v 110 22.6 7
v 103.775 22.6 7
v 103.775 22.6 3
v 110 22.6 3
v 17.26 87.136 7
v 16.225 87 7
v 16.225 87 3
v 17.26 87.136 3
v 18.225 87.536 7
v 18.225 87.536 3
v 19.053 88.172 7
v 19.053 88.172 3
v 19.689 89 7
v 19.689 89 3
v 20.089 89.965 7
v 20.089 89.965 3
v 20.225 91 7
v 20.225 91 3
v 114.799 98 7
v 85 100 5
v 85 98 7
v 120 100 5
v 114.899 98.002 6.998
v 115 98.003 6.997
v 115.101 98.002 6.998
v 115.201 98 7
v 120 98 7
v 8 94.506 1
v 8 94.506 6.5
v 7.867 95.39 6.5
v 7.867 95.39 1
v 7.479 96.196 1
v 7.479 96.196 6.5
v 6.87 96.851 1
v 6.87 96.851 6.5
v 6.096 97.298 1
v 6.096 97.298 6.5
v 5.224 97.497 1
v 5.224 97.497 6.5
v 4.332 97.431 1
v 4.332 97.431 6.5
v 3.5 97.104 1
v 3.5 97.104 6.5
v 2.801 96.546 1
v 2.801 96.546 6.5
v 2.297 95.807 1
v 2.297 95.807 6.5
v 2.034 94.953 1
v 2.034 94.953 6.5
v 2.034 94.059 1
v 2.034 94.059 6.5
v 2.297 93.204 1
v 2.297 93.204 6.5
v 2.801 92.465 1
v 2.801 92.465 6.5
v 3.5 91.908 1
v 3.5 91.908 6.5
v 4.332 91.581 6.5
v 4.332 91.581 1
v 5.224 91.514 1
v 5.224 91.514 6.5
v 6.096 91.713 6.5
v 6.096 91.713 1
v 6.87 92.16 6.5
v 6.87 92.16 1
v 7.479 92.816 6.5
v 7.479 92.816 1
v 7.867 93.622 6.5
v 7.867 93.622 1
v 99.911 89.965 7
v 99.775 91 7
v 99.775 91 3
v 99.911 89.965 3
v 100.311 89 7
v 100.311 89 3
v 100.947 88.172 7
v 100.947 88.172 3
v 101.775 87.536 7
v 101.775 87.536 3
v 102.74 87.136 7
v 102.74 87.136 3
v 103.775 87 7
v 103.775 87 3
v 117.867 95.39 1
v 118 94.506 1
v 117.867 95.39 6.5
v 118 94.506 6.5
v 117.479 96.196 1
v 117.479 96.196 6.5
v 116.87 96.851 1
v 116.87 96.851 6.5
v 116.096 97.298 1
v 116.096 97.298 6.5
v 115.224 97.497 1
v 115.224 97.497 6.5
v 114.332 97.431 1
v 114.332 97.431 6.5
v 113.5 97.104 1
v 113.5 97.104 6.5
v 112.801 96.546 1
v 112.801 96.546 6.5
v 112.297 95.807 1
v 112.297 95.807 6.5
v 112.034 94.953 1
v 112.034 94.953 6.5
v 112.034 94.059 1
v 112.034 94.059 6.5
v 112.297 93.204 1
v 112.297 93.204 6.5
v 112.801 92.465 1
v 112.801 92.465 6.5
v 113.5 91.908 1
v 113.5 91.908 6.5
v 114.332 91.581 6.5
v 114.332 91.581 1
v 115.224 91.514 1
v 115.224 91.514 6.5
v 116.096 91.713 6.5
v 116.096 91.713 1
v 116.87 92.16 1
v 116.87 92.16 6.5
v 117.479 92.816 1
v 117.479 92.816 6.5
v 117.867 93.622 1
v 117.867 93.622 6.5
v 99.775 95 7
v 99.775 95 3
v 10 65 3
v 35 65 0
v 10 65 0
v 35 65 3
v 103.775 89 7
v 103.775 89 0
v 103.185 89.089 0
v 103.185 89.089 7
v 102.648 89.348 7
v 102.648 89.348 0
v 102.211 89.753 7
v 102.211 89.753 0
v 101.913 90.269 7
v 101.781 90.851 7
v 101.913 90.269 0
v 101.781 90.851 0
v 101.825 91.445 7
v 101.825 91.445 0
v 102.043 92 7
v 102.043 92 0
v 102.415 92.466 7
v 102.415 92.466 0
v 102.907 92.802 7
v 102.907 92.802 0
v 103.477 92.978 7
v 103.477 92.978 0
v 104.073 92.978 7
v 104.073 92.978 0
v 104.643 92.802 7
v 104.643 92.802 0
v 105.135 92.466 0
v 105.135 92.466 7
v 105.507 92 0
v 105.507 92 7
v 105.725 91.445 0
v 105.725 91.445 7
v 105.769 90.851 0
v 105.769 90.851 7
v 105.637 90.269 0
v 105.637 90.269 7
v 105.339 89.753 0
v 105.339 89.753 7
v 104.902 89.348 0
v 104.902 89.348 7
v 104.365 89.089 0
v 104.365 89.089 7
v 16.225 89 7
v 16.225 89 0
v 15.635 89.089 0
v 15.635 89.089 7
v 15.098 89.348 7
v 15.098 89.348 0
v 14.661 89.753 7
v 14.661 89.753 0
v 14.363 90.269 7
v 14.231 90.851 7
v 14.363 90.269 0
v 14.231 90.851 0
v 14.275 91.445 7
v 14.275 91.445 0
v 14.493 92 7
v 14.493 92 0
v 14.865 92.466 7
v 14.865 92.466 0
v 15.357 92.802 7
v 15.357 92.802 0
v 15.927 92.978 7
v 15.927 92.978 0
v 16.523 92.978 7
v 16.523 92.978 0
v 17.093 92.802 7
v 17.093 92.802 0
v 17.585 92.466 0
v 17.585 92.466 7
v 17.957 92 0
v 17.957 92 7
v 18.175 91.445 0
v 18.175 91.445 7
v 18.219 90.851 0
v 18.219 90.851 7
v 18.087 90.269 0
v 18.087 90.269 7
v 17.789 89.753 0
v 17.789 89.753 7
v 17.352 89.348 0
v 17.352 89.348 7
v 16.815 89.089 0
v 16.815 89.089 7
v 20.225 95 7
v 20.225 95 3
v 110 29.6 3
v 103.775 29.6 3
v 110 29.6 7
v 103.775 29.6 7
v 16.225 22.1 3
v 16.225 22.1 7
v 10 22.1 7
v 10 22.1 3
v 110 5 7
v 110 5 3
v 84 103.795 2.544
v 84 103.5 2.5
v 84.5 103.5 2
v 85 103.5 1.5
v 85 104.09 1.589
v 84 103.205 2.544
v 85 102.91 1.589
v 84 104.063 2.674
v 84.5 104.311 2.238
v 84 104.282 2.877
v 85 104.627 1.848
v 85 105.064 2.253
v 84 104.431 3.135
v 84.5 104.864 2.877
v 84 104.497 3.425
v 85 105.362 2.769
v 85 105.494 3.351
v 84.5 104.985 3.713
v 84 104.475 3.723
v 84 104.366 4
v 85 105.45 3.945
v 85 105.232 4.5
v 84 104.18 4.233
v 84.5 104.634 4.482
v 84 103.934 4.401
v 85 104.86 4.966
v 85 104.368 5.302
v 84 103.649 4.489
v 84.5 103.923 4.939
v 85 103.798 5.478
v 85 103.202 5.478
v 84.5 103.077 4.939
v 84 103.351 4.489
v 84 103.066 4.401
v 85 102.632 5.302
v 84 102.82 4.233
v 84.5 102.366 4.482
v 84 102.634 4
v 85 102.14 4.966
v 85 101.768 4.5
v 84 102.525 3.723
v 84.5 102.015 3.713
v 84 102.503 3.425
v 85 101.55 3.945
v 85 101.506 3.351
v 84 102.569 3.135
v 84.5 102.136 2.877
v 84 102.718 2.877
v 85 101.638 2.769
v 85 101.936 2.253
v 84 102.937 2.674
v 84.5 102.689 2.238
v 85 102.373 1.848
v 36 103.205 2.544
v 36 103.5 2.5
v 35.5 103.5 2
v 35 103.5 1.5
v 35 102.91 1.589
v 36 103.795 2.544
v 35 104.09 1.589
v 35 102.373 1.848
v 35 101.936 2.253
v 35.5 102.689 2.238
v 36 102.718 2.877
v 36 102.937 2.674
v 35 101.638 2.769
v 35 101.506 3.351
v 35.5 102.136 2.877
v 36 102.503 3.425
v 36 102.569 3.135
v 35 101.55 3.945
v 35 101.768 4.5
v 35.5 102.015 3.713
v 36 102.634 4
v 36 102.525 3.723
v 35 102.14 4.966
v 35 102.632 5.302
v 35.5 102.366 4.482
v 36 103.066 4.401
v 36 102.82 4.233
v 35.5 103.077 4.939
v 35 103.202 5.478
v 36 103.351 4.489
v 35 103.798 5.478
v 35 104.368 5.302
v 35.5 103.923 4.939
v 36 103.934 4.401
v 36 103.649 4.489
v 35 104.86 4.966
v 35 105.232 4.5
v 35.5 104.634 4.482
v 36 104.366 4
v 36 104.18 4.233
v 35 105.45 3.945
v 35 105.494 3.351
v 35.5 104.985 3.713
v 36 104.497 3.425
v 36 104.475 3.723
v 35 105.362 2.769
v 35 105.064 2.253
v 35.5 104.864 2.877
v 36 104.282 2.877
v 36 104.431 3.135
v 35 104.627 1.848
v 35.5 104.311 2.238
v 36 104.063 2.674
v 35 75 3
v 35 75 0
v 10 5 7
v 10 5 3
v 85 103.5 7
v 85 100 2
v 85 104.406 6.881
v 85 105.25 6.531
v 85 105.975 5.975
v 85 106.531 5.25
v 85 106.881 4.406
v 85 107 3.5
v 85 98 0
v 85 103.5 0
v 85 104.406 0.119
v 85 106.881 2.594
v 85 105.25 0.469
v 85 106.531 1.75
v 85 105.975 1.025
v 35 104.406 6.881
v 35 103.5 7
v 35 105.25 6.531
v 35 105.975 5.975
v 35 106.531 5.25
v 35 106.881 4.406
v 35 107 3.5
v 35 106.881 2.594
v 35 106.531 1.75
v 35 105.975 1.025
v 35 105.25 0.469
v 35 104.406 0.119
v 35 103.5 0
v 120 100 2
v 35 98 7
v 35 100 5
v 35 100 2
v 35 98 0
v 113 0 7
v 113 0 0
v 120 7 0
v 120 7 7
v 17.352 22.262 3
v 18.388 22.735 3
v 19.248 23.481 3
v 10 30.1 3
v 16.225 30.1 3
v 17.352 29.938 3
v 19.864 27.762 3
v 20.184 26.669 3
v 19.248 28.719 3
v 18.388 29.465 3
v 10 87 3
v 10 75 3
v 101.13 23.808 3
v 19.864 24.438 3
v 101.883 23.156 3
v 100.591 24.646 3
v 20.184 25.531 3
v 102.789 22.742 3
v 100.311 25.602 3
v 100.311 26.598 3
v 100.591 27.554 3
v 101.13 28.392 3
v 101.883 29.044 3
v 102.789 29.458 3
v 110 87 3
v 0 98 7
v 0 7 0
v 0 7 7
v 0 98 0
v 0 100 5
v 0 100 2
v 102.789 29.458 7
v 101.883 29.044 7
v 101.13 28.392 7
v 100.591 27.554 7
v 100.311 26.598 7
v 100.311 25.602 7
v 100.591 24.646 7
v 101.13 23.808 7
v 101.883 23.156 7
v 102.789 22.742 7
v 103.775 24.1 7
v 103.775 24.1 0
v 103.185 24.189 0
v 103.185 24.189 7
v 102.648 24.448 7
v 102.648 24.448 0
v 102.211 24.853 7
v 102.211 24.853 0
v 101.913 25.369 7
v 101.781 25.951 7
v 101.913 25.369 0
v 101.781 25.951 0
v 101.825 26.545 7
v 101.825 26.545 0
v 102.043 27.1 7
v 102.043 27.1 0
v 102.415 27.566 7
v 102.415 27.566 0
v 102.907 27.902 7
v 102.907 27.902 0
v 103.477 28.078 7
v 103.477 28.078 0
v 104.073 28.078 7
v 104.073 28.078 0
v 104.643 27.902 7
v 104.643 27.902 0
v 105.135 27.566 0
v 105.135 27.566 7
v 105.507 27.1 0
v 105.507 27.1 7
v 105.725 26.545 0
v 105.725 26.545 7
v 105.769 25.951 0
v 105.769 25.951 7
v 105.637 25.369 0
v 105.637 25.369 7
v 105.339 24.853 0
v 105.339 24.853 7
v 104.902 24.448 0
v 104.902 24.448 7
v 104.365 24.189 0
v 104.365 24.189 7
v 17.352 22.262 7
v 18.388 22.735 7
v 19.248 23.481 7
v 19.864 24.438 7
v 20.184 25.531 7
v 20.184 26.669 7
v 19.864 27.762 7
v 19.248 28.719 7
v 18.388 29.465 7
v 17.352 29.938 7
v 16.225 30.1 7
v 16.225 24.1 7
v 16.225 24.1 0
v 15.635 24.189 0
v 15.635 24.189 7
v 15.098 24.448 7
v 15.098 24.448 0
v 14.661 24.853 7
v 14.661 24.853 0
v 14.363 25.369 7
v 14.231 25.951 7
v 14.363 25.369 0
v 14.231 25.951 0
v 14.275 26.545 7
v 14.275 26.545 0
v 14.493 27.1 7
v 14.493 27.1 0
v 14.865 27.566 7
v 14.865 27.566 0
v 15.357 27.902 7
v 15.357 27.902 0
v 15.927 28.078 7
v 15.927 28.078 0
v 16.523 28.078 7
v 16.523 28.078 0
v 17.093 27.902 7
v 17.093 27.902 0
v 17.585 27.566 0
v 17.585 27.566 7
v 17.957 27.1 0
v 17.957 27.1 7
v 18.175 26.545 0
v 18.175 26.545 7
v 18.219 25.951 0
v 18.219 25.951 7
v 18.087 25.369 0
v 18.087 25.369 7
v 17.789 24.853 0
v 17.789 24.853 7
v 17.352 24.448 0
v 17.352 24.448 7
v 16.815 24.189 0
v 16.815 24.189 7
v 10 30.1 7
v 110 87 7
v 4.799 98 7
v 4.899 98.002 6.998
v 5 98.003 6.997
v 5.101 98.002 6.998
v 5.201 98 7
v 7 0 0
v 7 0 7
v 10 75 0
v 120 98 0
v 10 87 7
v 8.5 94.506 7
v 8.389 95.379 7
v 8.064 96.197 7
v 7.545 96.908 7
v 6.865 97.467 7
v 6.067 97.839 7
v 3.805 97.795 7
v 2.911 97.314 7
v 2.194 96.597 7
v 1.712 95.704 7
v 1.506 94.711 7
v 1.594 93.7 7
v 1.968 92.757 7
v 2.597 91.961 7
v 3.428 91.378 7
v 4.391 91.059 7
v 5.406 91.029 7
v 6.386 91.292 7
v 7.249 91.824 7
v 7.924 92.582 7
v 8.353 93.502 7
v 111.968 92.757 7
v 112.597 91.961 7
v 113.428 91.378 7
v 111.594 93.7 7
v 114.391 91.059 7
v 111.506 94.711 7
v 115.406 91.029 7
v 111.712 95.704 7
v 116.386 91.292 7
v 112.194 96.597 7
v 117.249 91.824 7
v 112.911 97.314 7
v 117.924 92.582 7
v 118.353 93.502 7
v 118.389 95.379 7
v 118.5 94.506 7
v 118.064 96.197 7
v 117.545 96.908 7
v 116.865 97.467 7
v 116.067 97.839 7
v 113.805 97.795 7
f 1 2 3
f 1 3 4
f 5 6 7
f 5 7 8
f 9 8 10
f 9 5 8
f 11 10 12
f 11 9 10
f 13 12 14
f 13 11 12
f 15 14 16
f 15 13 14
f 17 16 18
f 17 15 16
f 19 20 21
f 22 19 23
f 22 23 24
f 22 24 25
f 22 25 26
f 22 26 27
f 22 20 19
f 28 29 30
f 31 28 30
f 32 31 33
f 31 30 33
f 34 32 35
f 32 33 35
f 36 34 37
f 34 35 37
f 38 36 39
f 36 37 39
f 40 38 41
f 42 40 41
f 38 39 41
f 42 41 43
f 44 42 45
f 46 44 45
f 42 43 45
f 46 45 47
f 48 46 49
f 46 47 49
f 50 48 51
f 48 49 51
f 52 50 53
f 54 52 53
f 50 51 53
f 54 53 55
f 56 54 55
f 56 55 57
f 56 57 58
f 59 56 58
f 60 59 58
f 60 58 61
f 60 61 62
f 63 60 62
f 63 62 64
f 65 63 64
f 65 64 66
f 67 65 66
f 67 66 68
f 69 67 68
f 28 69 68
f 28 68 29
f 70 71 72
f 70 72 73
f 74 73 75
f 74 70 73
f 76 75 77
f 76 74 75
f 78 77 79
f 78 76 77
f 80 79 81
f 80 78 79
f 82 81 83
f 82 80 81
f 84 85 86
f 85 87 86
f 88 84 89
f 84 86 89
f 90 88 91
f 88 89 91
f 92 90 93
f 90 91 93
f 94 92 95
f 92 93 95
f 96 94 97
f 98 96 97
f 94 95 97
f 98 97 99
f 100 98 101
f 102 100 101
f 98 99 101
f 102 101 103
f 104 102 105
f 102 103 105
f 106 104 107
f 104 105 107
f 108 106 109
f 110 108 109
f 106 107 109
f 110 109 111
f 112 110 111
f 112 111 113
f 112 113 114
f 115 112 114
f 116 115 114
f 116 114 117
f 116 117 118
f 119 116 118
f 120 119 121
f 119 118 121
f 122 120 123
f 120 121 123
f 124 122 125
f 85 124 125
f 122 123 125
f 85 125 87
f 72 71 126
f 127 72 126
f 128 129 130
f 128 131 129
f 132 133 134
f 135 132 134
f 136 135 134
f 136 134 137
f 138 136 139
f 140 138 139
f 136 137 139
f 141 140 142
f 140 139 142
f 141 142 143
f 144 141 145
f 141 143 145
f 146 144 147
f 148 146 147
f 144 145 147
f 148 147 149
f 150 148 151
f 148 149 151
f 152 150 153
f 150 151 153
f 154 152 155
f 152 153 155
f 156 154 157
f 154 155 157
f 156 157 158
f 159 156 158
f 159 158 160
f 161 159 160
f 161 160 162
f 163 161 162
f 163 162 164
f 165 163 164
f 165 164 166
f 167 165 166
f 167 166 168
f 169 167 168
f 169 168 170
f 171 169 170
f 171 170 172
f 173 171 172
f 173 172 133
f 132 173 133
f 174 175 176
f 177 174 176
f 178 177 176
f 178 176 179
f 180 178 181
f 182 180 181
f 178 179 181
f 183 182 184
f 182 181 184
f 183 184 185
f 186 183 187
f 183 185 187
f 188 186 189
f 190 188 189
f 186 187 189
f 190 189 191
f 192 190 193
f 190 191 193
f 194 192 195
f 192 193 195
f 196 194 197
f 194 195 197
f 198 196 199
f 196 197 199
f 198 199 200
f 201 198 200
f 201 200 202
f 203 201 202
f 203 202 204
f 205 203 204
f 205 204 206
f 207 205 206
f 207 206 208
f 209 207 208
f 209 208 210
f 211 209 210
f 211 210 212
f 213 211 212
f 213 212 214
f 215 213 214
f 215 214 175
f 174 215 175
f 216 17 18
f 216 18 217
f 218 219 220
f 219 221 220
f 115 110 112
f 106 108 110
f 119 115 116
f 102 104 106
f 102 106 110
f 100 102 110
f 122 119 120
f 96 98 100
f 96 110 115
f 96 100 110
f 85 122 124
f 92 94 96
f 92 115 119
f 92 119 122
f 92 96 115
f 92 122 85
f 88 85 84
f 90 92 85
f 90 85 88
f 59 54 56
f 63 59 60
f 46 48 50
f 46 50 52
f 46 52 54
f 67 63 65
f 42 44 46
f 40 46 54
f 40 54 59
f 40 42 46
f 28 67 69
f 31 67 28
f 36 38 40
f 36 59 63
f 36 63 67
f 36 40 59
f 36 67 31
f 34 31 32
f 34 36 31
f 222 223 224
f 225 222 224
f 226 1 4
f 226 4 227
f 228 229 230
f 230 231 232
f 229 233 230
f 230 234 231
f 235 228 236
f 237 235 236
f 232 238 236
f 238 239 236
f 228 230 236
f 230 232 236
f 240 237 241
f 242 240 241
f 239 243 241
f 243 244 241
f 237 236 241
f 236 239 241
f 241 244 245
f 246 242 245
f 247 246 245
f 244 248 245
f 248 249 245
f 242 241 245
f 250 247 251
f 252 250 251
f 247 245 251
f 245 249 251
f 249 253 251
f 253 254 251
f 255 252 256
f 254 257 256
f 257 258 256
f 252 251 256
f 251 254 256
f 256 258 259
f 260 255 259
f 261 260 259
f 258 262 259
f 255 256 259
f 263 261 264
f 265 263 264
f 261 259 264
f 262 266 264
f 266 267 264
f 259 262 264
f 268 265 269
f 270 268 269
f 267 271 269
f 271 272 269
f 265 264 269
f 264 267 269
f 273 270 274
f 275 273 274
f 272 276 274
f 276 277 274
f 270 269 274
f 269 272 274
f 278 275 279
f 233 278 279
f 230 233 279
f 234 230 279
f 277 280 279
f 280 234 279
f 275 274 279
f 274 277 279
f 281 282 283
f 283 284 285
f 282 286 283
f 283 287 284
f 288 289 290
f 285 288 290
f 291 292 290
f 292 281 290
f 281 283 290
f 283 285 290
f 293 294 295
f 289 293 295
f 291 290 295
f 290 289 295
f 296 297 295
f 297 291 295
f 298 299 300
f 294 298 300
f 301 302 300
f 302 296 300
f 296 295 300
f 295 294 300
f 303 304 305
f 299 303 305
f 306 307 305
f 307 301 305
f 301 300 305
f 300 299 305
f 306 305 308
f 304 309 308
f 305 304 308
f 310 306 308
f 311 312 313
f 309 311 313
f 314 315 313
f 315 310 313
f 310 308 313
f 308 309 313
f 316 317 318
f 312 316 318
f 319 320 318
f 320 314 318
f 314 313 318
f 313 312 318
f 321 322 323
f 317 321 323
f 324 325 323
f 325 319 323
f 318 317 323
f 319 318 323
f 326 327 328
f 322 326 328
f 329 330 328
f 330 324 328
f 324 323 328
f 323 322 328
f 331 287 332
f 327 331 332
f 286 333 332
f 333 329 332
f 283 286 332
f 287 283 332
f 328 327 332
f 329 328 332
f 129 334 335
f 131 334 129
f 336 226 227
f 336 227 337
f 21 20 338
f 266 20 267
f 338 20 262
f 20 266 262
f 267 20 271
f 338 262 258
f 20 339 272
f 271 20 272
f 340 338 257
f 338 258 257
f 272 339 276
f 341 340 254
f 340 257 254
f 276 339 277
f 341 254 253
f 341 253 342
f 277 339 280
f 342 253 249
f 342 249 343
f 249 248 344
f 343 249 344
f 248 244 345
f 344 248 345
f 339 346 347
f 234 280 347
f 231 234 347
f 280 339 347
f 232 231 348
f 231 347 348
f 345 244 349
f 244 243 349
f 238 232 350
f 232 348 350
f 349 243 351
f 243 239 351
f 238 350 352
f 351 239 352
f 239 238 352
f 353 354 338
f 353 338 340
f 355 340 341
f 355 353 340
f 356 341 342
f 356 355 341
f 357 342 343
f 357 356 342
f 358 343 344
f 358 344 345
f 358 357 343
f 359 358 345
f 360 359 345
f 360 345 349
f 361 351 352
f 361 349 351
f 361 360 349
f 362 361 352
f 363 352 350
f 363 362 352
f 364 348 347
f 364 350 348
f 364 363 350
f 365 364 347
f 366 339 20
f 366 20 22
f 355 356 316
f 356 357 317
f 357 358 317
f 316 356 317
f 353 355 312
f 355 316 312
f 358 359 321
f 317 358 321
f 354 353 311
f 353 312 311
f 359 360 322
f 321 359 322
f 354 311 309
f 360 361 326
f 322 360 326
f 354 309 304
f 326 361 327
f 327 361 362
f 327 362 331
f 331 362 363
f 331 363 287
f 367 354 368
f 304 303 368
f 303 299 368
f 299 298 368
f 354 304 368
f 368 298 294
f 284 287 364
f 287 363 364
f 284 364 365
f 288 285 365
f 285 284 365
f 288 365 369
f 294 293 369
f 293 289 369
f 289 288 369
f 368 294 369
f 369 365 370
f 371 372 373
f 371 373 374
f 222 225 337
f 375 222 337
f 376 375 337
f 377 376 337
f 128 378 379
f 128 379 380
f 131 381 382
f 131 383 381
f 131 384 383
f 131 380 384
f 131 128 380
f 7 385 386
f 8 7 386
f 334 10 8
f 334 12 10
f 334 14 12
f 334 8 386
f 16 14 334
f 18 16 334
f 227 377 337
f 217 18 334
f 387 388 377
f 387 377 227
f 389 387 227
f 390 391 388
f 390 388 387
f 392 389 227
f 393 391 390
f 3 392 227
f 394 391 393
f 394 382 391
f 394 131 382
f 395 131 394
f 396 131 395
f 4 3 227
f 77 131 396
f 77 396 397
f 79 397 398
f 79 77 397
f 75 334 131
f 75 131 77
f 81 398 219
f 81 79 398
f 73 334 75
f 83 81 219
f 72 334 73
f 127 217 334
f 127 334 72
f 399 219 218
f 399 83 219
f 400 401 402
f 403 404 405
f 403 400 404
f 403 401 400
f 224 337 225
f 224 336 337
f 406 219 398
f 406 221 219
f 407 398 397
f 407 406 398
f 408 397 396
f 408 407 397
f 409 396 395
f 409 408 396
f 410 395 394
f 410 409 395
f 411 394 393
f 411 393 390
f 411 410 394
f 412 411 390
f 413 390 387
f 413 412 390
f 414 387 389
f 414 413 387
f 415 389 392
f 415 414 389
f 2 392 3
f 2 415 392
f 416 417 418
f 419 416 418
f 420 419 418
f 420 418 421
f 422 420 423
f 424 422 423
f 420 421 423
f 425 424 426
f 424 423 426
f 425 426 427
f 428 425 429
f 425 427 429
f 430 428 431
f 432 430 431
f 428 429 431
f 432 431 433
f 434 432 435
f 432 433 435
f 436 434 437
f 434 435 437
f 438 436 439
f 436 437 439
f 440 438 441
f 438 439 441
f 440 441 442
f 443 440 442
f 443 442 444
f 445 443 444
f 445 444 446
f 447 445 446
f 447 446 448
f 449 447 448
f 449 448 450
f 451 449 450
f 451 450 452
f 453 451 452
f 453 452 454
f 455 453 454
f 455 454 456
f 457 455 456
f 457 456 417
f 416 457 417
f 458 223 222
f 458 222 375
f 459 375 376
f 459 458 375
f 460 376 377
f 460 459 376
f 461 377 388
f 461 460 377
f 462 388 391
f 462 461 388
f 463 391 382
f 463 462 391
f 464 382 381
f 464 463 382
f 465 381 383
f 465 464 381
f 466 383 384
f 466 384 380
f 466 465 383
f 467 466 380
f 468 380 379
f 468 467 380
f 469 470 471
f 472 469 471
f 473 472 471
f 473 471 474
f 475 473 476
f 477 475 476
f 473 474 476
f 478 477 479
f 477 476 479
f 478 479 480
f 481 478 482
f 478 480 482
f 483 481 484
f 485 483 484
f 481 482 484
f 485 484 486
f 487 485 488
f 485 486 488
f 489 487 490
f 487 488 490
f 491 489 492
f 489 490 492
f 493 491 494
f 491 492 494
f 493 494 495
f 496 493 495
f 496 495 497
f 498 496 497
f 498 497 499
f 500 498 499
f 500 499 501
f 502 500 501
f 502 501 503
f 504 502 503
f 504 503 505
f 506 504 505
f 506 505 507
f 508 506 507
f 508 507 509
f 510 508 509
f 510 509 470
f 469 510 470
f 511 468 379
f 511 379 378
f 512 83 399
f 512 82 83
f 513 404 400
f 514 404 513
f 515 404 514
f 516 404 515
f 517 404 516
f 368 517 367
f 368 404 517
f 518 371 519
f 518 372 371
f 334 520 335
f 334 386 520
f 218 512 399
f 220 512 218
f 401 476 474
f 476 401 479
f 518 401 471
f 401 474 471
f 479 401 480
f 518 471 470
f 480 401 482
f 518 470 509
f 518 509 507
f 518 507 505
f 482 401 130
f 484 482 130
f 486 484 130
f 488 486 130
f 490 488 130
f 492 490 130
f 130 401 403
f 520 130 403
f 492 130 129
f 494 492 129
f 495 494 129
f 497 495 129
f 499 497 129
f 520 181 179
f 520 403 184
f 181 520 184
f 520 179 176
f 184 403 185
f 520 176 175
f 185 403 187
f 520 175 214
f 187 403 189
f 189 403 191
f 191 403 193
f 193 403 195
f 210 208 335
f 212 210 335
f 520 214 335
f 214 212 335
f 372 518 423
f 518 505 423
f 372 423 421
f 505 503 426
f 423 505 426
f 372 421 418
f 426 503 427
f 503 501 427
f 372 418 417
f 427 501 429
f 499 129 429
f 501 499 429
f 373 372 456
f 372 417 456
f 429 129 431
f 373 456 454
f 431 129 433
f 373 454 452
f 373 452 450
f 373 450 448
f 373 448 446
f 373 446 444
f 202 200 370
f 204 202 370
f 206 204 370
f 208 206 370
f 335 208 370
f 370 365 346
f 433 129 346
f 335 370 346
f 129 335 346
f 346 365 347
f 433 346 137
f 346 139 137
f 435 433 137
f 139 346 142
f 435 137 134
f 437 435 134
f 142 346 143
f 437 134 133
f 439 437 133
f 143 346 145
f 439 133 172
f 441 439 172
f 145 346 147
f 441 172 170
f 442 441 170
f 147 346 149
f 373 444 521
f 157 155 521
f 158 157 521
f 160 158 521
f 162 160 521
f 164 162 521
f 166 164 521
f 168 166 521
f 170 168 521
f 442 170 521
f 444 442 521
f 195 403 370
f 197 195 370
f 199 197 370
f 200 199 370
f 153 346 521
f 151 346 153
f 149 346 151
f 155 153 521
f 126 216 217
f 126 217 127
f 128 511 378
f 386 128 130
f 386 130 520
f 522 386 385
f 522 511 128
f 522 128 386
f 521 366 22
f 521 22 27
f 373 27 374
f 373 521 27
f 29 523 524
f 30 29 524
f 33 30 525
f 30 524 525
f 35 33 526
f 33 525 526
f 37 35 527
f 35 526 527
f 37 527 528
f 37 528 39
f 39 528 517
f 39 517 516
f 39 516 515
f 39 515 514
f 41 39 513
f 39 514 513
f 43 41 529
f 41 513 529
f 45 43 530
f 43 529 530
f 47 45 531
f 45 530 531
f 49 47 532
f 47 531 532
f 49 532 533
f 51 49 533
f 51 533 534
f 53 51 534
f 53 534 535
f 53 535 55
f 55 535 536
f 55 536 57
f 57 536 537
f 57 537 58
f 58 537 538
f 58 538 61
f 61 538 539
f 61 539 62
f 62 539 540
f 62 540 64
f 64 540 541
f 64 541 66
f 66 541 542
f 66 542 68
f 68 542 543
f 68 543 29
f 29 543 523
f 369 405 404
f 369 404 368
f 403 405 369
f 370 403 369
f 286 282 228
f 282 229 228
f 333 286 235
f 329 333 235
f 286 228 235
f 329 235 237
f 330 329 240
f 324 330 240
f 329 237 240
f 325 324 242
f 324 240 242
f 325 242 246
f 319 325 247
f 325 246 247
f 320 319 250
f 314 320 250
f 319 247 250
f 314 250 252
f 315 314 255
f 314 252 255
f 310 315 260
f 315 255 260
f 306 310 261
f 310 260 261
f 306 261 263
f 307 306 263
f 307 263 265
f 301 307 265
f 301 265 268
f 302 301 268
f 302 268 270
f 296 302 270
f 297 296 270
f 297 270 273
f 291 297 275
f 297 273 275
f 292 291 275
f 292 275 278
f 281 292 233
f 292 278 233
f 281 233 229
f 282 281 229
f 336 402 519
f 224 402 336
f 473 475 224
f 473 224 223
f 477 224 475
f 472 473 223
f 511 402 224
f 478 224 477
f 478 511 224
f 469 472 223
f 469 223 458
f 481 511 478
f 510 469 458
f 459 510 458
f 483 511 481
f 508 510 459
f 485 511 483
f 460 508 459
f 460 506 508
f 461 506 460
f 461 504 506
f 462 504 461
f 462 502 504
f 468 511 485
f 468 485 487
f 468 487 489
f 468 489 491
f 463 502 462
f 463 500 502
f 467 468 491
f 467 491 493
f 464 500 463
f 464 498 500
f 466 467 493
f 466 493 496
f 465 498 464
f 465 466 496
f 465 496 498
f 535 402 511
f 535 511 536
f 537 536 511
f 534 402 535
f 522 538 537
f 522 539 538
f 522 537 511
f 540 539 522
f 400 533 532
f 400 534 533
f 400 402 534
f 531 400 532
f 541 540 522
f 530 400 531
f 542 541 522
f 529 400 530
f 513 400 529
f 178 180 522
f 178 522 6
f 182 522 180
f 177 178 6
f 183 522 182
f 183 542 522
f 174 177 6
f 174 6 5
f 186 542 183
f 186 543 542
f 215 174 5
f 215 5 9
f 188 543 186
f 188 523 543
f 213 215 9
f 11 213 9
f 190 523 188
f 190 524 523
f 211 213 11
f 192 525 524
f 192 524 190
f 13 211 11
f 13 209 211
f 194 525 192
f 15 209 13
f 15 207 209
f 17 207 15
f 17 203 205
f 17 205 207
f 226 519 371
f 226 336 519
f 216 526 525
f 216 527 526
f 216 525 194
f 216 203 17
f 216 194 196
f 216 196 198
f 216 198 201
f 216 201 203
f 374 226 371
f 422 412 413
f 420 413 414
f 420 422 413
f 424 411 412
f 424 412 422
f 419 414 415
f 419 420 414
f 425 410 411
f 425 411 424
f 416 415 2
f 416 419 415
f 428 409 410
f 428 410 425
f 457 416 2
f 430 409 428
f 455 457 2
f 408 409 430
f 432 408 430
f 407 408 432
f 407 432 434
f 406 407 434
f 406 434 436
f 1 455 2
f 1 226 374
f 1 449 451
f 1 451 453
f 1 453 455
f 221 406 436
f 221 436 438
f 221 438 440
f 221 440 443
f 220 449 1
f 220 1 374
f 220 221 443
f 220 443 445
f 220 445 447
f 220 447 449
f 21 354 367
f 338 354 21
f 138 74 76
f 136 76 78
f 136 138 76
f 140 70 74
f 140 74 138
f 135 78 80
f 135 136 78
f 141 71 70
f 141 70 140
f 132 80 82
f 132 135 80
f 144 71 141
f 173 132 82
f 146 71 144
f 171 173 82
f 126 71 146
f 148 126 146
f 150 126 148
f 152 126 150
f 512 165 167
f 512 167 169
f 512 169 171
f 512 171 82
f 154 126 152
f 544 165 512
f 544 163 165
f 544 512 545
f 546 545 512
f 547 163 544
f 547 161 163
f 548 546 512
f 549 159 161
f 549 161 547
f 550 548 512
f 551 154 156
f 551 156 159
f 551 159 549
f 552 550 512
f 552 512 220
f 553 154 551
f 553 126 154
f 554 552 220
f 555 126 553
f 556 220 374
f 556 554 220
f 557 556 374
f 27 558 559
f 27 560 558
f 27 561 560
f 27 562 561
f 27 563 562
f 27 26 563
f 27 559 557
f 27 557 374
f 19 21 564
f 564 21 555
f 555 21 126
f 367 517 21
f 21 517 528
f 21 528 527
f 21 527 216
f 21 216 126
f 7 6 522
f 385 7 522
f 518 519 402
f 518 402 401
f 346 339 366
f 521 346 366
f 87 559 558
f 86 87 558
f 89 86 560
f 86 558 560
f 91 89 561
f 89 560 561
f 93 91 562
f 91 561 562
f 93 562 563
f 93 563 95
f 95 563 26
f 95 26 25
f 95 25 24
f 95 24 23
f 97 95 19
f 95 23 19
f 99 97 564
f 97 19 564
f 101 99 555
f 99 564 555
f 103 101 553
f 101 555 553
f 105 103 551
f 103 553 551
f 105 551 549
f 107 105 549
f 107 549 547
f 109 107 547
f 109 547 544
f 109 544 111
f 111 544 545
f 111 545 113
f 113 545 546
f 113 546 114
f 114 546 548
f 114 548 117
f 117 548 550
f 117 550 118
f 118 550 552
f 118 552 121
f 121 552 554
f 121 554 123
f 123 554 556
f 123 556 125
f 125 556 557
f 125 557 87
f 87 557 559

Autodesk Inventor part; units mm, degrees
ref_plane "YZ Plane" through (0, 0, 0) normal (1, 0, 0) x (0, 1, 0)
ref_plane "XZ Plane" through (0, 0, 0) normal (0, 1, 0) x (-1, 0, 0)
ref_plane "XY Plane" through (0, 0, 0) normal (0, 0, 1) x (1, 0, 0)
sketch "Sketch1" plane through (0, 0, 0) normal (0, 0, 1) x (1, 0, 0)
  line L0 (0, 100) -> (120, 100)
  line L1 (120, 100) -> (120, 0)
  line L2 (120, 0) -> (0, 0)
  line L3 (0, 0) -> (0, 100)
  line L4 (35, 100) -> (85, 100)
  line L5 (85, 100) -> (85, 107)
  line L6 (85, 107) -> (35, 107)
  line L7 (35, 107) -> (35, 100)
  point P0 (60, 100)
  dimension "d0" = 120
  dimension "d1" = 50
  dimension "d2" = 7
  dimension "d3" = 100
extrude "Extrusion1" add sketch "Sketch1" along normal blind 7
fillet "Fillet1" radius 3.5 2 edges at (60, 107, 7) (60, 107, 0)
sketch "Sketch2" plane through (85, 100, 7) normal (1, 0, 0) x (0, 0, -1)
  arc A0 (7, 3.5) -> (0, 3.5) centre (3.5, 3.5) ccw projected
  line L0 (0, 0) -> (0, 3.5) projected
  line L1 (7, 0) -> (0, 0) projected
  line L2 (7, 0) -> (7, 3.5) projected
  circle A1 centre (3.5, 3.5) radius 1
  point P0 (7, -100)
  dimension "d7" = 2
extrude "Extrusion2" cut sketch "Sketch2" against normal through all contours A1
ref_plane "Work Plane1" through (60, 0, 0) normal (1, 0, 0) x (0, 0, -1)
ref_plane "Work Plane2" through (0, 50, 0) normal (0, 1, 0) x (1, 0, 0)
chamfer "Chamfer1" distance 2 angle 45 4 edges at (17.5, 100, 7) (17.5, 100, 0) (102.5, 100, 0) (102.5, 100, 7)
sketch "Sketch3" plane through (0, 0, 7) normal (0, 0, 1) x (1, 0, 0)
  circle A0 centre (115, 94.5058) radius 3 projected
  circle A1 centre (5, 94.5058) radius 3 projected
  point P0 (0, 0)
extrude "Extrusion3" cut sketch "Sketch3" against normal blind 6
chamfer "Chamfer2" distance 0.5 angle 45 2 edges at (112, 94.5058, 7) (2, 94.5058, 7)
sketch "Sketch4" plane through (0, 0, 7) normal (0, 0, 1) x (1, 0, 0)
  line L0 (10, 95) -> (110, 95)
  line L1 (110, 95) -> (110, 5)
  line L2 (110, 5) -> (10, 5)
  line L3 (10, 5) -> (10, 95)
  line L4 (35, 100) -> (0, 100) projected
  line L5 (0, 98) -> (0, 0) projected
  line L6 (120, 0) -> (120, 98) projected
  line L7 (0, 0) -> (120, 0) projected
  line L8 (16.225, 91) -> (103.775, 91) construction
  line L9 (103.775, 91) -> (103.775, 26.1) construction
  line L10 (103.775, 26.1) -> (16.225, 26.1) construction
  line L11 (16.225, 26.1) -> (16.225, 91) construction
  circle A0 centre (16.225, 91) radius 4
  line L12 (20.225, 91) -> (20.225, 95)
  line L13 (16.225, 87) -> (10, 87)
  circle A1 centre (16.225, 26.1) radius 4
  line L14 (16.225, 30.1) -> (10, 30.1)
  line L15 (16.225, 22.1) -> (10, 22.1)
  circle A2 centre (103.775, 91) radius 4
  circle A3 centre (103.775, 26.1) radius 3.5
  line L16 (103.775, 29.6) -> (110, 29.6)
  line L17 (103.775, 22.6) -> (110, 22.6)
  line L18 (99.775, 91) -> (99.775, 95)
  line L19 (103.775, 87) -> (110, 87)
  point P0 (60, 91)
  point P1 (60, 95)
  dimension "d18" = 5
  dimension "d19" = 10
  dimension "d20" = 10
  dimension "d21" = 5
  dimension "d24" = 87.55
  dimension "d25" = 64.9
  dimension "d26" = 4
  dimension "d27" = 8
  dimension "d28" = 8
  dimension "d29" = 8
  dimension "d30" = 7
extrude "Extrusion4" cut sketch "Sketch4" against normal blind 4 contours L0 L18 A2 L19 L1 L16 A3 L17 L2 L3 L15 A1 L14 L13 A0 L12
sketch "Sketch5" plane through (0, 0, 7) normal (0, 0, 1) x (1, 0, 0)
  line L0 (103.775, 22.6) -> (110, 22.6) projected
  line L1 (110, 22.6) -> (110, 5) projected
  line L2 (110, 5) -> (10, 5) projected
  line L3 (10, 5) -> (10, 22.1) projected
  line L4 (10, 22.1) -> (16.225, 22.1) projected
  arc A0 (16.225, 22.1) -> (16.225, 30.1) centre (16.225, 26.1) ccw projected
  line L5 (16.225, 30.1) -> (10, 30.1) projected
  line L6 (10, 30.1) -> (10, 87) projected
  line L7 (10, 87) -> (16.225, 87) projected
  arc A1 (16.225, 87) -> (20.225, 91) centre (16.225, 91) ccw projected
  line L8 (20.225, 91) -> (20.225, 95) projected
  line L9 (20.225, 95) -> (99.775, 95) projected
  line L10 (99.775, 95) -> (99.775, 91) projected
  arc A2 (99.775, 91) -> (103.775, 87) centre (103.775, 91) ccw projected
  line L11 (103.775, 87) -> (110, 87) projected
  line L12 (110, 87) -> (110, 29.6) projected
  line L13 (110, 29.6) -> (103.775, 29.6) projected
  arc A3 (103.775, 29.6) -> (103.775, 22.6) centre (103.775, 26.1) ccw projected
  arc A4 (4.798, 98) -> (5.202, 98) centre (5, 94.5058) ccw projected
  line L14 (0, 98) -> (4.798, 98) projected
  line L15 (0, 98) -> (0, 0) projected
  line L16 (0, 0) -> (120, 0) projected
  line L17 (120, 0) -> (120, 98) projected
  line L18 (115.202, 98) -> (120, 98) projected
  arc A5 (114.798, 98) -> (115.202, 98) centre (115, 94.5058) ccw projected
  line L19 (85, 98) -> (114.798, 98) projected
  line L20 (85, 98) -> (85, 103.5) projected
  line L21 (35, 103.5) -> (85, 103.5) projected
  line L22 (35, 103.5) -> (35, 98) projected
  line L23 (5.202, 98) -> (35, 98) projected
hole "Hole1" at (16.225, 91, 7) at (16.225, 26.1, 7) at (103.775, 26.1, 7) at (103.775, 91, 7) direction (0, 0, -1) diameter 4 end through all
sketch "Sketch6" plane through (0, 0, 3) normal (0, 0, 1) x (1, 0, 0)
  line L0 (10, 30.1) -> (10, 87) projected
  line L1 (10, 75) -> (35, 75)
  line L2 (35, 75) -> (35, 65)
  line L3 (35, 65) -> (10, 65)
  line L4 (10, 65) -> (10, 75)
  line L5 (20.225, 95) -> (99.775, 95) projected
  point P0 (0, 0)
  point P1 (10, 65)
  dimension "d40" = 20
  dimension "d41" = 10
  dimension "d42" = 25
extrude "Extrusion5" cut sketch "Sketch6" against normal through all
chamfer "Chamfer3" distance 7 angle 45 2 edges at (120, 0, 3.5) (0, 0, 3.5)
chamfer "Chamfer4" distance 1 angle 45 2 edges at (35, 103.5, 4.5) (85, 103.5, 4.5)
properties part number "LCD Mount 2"
